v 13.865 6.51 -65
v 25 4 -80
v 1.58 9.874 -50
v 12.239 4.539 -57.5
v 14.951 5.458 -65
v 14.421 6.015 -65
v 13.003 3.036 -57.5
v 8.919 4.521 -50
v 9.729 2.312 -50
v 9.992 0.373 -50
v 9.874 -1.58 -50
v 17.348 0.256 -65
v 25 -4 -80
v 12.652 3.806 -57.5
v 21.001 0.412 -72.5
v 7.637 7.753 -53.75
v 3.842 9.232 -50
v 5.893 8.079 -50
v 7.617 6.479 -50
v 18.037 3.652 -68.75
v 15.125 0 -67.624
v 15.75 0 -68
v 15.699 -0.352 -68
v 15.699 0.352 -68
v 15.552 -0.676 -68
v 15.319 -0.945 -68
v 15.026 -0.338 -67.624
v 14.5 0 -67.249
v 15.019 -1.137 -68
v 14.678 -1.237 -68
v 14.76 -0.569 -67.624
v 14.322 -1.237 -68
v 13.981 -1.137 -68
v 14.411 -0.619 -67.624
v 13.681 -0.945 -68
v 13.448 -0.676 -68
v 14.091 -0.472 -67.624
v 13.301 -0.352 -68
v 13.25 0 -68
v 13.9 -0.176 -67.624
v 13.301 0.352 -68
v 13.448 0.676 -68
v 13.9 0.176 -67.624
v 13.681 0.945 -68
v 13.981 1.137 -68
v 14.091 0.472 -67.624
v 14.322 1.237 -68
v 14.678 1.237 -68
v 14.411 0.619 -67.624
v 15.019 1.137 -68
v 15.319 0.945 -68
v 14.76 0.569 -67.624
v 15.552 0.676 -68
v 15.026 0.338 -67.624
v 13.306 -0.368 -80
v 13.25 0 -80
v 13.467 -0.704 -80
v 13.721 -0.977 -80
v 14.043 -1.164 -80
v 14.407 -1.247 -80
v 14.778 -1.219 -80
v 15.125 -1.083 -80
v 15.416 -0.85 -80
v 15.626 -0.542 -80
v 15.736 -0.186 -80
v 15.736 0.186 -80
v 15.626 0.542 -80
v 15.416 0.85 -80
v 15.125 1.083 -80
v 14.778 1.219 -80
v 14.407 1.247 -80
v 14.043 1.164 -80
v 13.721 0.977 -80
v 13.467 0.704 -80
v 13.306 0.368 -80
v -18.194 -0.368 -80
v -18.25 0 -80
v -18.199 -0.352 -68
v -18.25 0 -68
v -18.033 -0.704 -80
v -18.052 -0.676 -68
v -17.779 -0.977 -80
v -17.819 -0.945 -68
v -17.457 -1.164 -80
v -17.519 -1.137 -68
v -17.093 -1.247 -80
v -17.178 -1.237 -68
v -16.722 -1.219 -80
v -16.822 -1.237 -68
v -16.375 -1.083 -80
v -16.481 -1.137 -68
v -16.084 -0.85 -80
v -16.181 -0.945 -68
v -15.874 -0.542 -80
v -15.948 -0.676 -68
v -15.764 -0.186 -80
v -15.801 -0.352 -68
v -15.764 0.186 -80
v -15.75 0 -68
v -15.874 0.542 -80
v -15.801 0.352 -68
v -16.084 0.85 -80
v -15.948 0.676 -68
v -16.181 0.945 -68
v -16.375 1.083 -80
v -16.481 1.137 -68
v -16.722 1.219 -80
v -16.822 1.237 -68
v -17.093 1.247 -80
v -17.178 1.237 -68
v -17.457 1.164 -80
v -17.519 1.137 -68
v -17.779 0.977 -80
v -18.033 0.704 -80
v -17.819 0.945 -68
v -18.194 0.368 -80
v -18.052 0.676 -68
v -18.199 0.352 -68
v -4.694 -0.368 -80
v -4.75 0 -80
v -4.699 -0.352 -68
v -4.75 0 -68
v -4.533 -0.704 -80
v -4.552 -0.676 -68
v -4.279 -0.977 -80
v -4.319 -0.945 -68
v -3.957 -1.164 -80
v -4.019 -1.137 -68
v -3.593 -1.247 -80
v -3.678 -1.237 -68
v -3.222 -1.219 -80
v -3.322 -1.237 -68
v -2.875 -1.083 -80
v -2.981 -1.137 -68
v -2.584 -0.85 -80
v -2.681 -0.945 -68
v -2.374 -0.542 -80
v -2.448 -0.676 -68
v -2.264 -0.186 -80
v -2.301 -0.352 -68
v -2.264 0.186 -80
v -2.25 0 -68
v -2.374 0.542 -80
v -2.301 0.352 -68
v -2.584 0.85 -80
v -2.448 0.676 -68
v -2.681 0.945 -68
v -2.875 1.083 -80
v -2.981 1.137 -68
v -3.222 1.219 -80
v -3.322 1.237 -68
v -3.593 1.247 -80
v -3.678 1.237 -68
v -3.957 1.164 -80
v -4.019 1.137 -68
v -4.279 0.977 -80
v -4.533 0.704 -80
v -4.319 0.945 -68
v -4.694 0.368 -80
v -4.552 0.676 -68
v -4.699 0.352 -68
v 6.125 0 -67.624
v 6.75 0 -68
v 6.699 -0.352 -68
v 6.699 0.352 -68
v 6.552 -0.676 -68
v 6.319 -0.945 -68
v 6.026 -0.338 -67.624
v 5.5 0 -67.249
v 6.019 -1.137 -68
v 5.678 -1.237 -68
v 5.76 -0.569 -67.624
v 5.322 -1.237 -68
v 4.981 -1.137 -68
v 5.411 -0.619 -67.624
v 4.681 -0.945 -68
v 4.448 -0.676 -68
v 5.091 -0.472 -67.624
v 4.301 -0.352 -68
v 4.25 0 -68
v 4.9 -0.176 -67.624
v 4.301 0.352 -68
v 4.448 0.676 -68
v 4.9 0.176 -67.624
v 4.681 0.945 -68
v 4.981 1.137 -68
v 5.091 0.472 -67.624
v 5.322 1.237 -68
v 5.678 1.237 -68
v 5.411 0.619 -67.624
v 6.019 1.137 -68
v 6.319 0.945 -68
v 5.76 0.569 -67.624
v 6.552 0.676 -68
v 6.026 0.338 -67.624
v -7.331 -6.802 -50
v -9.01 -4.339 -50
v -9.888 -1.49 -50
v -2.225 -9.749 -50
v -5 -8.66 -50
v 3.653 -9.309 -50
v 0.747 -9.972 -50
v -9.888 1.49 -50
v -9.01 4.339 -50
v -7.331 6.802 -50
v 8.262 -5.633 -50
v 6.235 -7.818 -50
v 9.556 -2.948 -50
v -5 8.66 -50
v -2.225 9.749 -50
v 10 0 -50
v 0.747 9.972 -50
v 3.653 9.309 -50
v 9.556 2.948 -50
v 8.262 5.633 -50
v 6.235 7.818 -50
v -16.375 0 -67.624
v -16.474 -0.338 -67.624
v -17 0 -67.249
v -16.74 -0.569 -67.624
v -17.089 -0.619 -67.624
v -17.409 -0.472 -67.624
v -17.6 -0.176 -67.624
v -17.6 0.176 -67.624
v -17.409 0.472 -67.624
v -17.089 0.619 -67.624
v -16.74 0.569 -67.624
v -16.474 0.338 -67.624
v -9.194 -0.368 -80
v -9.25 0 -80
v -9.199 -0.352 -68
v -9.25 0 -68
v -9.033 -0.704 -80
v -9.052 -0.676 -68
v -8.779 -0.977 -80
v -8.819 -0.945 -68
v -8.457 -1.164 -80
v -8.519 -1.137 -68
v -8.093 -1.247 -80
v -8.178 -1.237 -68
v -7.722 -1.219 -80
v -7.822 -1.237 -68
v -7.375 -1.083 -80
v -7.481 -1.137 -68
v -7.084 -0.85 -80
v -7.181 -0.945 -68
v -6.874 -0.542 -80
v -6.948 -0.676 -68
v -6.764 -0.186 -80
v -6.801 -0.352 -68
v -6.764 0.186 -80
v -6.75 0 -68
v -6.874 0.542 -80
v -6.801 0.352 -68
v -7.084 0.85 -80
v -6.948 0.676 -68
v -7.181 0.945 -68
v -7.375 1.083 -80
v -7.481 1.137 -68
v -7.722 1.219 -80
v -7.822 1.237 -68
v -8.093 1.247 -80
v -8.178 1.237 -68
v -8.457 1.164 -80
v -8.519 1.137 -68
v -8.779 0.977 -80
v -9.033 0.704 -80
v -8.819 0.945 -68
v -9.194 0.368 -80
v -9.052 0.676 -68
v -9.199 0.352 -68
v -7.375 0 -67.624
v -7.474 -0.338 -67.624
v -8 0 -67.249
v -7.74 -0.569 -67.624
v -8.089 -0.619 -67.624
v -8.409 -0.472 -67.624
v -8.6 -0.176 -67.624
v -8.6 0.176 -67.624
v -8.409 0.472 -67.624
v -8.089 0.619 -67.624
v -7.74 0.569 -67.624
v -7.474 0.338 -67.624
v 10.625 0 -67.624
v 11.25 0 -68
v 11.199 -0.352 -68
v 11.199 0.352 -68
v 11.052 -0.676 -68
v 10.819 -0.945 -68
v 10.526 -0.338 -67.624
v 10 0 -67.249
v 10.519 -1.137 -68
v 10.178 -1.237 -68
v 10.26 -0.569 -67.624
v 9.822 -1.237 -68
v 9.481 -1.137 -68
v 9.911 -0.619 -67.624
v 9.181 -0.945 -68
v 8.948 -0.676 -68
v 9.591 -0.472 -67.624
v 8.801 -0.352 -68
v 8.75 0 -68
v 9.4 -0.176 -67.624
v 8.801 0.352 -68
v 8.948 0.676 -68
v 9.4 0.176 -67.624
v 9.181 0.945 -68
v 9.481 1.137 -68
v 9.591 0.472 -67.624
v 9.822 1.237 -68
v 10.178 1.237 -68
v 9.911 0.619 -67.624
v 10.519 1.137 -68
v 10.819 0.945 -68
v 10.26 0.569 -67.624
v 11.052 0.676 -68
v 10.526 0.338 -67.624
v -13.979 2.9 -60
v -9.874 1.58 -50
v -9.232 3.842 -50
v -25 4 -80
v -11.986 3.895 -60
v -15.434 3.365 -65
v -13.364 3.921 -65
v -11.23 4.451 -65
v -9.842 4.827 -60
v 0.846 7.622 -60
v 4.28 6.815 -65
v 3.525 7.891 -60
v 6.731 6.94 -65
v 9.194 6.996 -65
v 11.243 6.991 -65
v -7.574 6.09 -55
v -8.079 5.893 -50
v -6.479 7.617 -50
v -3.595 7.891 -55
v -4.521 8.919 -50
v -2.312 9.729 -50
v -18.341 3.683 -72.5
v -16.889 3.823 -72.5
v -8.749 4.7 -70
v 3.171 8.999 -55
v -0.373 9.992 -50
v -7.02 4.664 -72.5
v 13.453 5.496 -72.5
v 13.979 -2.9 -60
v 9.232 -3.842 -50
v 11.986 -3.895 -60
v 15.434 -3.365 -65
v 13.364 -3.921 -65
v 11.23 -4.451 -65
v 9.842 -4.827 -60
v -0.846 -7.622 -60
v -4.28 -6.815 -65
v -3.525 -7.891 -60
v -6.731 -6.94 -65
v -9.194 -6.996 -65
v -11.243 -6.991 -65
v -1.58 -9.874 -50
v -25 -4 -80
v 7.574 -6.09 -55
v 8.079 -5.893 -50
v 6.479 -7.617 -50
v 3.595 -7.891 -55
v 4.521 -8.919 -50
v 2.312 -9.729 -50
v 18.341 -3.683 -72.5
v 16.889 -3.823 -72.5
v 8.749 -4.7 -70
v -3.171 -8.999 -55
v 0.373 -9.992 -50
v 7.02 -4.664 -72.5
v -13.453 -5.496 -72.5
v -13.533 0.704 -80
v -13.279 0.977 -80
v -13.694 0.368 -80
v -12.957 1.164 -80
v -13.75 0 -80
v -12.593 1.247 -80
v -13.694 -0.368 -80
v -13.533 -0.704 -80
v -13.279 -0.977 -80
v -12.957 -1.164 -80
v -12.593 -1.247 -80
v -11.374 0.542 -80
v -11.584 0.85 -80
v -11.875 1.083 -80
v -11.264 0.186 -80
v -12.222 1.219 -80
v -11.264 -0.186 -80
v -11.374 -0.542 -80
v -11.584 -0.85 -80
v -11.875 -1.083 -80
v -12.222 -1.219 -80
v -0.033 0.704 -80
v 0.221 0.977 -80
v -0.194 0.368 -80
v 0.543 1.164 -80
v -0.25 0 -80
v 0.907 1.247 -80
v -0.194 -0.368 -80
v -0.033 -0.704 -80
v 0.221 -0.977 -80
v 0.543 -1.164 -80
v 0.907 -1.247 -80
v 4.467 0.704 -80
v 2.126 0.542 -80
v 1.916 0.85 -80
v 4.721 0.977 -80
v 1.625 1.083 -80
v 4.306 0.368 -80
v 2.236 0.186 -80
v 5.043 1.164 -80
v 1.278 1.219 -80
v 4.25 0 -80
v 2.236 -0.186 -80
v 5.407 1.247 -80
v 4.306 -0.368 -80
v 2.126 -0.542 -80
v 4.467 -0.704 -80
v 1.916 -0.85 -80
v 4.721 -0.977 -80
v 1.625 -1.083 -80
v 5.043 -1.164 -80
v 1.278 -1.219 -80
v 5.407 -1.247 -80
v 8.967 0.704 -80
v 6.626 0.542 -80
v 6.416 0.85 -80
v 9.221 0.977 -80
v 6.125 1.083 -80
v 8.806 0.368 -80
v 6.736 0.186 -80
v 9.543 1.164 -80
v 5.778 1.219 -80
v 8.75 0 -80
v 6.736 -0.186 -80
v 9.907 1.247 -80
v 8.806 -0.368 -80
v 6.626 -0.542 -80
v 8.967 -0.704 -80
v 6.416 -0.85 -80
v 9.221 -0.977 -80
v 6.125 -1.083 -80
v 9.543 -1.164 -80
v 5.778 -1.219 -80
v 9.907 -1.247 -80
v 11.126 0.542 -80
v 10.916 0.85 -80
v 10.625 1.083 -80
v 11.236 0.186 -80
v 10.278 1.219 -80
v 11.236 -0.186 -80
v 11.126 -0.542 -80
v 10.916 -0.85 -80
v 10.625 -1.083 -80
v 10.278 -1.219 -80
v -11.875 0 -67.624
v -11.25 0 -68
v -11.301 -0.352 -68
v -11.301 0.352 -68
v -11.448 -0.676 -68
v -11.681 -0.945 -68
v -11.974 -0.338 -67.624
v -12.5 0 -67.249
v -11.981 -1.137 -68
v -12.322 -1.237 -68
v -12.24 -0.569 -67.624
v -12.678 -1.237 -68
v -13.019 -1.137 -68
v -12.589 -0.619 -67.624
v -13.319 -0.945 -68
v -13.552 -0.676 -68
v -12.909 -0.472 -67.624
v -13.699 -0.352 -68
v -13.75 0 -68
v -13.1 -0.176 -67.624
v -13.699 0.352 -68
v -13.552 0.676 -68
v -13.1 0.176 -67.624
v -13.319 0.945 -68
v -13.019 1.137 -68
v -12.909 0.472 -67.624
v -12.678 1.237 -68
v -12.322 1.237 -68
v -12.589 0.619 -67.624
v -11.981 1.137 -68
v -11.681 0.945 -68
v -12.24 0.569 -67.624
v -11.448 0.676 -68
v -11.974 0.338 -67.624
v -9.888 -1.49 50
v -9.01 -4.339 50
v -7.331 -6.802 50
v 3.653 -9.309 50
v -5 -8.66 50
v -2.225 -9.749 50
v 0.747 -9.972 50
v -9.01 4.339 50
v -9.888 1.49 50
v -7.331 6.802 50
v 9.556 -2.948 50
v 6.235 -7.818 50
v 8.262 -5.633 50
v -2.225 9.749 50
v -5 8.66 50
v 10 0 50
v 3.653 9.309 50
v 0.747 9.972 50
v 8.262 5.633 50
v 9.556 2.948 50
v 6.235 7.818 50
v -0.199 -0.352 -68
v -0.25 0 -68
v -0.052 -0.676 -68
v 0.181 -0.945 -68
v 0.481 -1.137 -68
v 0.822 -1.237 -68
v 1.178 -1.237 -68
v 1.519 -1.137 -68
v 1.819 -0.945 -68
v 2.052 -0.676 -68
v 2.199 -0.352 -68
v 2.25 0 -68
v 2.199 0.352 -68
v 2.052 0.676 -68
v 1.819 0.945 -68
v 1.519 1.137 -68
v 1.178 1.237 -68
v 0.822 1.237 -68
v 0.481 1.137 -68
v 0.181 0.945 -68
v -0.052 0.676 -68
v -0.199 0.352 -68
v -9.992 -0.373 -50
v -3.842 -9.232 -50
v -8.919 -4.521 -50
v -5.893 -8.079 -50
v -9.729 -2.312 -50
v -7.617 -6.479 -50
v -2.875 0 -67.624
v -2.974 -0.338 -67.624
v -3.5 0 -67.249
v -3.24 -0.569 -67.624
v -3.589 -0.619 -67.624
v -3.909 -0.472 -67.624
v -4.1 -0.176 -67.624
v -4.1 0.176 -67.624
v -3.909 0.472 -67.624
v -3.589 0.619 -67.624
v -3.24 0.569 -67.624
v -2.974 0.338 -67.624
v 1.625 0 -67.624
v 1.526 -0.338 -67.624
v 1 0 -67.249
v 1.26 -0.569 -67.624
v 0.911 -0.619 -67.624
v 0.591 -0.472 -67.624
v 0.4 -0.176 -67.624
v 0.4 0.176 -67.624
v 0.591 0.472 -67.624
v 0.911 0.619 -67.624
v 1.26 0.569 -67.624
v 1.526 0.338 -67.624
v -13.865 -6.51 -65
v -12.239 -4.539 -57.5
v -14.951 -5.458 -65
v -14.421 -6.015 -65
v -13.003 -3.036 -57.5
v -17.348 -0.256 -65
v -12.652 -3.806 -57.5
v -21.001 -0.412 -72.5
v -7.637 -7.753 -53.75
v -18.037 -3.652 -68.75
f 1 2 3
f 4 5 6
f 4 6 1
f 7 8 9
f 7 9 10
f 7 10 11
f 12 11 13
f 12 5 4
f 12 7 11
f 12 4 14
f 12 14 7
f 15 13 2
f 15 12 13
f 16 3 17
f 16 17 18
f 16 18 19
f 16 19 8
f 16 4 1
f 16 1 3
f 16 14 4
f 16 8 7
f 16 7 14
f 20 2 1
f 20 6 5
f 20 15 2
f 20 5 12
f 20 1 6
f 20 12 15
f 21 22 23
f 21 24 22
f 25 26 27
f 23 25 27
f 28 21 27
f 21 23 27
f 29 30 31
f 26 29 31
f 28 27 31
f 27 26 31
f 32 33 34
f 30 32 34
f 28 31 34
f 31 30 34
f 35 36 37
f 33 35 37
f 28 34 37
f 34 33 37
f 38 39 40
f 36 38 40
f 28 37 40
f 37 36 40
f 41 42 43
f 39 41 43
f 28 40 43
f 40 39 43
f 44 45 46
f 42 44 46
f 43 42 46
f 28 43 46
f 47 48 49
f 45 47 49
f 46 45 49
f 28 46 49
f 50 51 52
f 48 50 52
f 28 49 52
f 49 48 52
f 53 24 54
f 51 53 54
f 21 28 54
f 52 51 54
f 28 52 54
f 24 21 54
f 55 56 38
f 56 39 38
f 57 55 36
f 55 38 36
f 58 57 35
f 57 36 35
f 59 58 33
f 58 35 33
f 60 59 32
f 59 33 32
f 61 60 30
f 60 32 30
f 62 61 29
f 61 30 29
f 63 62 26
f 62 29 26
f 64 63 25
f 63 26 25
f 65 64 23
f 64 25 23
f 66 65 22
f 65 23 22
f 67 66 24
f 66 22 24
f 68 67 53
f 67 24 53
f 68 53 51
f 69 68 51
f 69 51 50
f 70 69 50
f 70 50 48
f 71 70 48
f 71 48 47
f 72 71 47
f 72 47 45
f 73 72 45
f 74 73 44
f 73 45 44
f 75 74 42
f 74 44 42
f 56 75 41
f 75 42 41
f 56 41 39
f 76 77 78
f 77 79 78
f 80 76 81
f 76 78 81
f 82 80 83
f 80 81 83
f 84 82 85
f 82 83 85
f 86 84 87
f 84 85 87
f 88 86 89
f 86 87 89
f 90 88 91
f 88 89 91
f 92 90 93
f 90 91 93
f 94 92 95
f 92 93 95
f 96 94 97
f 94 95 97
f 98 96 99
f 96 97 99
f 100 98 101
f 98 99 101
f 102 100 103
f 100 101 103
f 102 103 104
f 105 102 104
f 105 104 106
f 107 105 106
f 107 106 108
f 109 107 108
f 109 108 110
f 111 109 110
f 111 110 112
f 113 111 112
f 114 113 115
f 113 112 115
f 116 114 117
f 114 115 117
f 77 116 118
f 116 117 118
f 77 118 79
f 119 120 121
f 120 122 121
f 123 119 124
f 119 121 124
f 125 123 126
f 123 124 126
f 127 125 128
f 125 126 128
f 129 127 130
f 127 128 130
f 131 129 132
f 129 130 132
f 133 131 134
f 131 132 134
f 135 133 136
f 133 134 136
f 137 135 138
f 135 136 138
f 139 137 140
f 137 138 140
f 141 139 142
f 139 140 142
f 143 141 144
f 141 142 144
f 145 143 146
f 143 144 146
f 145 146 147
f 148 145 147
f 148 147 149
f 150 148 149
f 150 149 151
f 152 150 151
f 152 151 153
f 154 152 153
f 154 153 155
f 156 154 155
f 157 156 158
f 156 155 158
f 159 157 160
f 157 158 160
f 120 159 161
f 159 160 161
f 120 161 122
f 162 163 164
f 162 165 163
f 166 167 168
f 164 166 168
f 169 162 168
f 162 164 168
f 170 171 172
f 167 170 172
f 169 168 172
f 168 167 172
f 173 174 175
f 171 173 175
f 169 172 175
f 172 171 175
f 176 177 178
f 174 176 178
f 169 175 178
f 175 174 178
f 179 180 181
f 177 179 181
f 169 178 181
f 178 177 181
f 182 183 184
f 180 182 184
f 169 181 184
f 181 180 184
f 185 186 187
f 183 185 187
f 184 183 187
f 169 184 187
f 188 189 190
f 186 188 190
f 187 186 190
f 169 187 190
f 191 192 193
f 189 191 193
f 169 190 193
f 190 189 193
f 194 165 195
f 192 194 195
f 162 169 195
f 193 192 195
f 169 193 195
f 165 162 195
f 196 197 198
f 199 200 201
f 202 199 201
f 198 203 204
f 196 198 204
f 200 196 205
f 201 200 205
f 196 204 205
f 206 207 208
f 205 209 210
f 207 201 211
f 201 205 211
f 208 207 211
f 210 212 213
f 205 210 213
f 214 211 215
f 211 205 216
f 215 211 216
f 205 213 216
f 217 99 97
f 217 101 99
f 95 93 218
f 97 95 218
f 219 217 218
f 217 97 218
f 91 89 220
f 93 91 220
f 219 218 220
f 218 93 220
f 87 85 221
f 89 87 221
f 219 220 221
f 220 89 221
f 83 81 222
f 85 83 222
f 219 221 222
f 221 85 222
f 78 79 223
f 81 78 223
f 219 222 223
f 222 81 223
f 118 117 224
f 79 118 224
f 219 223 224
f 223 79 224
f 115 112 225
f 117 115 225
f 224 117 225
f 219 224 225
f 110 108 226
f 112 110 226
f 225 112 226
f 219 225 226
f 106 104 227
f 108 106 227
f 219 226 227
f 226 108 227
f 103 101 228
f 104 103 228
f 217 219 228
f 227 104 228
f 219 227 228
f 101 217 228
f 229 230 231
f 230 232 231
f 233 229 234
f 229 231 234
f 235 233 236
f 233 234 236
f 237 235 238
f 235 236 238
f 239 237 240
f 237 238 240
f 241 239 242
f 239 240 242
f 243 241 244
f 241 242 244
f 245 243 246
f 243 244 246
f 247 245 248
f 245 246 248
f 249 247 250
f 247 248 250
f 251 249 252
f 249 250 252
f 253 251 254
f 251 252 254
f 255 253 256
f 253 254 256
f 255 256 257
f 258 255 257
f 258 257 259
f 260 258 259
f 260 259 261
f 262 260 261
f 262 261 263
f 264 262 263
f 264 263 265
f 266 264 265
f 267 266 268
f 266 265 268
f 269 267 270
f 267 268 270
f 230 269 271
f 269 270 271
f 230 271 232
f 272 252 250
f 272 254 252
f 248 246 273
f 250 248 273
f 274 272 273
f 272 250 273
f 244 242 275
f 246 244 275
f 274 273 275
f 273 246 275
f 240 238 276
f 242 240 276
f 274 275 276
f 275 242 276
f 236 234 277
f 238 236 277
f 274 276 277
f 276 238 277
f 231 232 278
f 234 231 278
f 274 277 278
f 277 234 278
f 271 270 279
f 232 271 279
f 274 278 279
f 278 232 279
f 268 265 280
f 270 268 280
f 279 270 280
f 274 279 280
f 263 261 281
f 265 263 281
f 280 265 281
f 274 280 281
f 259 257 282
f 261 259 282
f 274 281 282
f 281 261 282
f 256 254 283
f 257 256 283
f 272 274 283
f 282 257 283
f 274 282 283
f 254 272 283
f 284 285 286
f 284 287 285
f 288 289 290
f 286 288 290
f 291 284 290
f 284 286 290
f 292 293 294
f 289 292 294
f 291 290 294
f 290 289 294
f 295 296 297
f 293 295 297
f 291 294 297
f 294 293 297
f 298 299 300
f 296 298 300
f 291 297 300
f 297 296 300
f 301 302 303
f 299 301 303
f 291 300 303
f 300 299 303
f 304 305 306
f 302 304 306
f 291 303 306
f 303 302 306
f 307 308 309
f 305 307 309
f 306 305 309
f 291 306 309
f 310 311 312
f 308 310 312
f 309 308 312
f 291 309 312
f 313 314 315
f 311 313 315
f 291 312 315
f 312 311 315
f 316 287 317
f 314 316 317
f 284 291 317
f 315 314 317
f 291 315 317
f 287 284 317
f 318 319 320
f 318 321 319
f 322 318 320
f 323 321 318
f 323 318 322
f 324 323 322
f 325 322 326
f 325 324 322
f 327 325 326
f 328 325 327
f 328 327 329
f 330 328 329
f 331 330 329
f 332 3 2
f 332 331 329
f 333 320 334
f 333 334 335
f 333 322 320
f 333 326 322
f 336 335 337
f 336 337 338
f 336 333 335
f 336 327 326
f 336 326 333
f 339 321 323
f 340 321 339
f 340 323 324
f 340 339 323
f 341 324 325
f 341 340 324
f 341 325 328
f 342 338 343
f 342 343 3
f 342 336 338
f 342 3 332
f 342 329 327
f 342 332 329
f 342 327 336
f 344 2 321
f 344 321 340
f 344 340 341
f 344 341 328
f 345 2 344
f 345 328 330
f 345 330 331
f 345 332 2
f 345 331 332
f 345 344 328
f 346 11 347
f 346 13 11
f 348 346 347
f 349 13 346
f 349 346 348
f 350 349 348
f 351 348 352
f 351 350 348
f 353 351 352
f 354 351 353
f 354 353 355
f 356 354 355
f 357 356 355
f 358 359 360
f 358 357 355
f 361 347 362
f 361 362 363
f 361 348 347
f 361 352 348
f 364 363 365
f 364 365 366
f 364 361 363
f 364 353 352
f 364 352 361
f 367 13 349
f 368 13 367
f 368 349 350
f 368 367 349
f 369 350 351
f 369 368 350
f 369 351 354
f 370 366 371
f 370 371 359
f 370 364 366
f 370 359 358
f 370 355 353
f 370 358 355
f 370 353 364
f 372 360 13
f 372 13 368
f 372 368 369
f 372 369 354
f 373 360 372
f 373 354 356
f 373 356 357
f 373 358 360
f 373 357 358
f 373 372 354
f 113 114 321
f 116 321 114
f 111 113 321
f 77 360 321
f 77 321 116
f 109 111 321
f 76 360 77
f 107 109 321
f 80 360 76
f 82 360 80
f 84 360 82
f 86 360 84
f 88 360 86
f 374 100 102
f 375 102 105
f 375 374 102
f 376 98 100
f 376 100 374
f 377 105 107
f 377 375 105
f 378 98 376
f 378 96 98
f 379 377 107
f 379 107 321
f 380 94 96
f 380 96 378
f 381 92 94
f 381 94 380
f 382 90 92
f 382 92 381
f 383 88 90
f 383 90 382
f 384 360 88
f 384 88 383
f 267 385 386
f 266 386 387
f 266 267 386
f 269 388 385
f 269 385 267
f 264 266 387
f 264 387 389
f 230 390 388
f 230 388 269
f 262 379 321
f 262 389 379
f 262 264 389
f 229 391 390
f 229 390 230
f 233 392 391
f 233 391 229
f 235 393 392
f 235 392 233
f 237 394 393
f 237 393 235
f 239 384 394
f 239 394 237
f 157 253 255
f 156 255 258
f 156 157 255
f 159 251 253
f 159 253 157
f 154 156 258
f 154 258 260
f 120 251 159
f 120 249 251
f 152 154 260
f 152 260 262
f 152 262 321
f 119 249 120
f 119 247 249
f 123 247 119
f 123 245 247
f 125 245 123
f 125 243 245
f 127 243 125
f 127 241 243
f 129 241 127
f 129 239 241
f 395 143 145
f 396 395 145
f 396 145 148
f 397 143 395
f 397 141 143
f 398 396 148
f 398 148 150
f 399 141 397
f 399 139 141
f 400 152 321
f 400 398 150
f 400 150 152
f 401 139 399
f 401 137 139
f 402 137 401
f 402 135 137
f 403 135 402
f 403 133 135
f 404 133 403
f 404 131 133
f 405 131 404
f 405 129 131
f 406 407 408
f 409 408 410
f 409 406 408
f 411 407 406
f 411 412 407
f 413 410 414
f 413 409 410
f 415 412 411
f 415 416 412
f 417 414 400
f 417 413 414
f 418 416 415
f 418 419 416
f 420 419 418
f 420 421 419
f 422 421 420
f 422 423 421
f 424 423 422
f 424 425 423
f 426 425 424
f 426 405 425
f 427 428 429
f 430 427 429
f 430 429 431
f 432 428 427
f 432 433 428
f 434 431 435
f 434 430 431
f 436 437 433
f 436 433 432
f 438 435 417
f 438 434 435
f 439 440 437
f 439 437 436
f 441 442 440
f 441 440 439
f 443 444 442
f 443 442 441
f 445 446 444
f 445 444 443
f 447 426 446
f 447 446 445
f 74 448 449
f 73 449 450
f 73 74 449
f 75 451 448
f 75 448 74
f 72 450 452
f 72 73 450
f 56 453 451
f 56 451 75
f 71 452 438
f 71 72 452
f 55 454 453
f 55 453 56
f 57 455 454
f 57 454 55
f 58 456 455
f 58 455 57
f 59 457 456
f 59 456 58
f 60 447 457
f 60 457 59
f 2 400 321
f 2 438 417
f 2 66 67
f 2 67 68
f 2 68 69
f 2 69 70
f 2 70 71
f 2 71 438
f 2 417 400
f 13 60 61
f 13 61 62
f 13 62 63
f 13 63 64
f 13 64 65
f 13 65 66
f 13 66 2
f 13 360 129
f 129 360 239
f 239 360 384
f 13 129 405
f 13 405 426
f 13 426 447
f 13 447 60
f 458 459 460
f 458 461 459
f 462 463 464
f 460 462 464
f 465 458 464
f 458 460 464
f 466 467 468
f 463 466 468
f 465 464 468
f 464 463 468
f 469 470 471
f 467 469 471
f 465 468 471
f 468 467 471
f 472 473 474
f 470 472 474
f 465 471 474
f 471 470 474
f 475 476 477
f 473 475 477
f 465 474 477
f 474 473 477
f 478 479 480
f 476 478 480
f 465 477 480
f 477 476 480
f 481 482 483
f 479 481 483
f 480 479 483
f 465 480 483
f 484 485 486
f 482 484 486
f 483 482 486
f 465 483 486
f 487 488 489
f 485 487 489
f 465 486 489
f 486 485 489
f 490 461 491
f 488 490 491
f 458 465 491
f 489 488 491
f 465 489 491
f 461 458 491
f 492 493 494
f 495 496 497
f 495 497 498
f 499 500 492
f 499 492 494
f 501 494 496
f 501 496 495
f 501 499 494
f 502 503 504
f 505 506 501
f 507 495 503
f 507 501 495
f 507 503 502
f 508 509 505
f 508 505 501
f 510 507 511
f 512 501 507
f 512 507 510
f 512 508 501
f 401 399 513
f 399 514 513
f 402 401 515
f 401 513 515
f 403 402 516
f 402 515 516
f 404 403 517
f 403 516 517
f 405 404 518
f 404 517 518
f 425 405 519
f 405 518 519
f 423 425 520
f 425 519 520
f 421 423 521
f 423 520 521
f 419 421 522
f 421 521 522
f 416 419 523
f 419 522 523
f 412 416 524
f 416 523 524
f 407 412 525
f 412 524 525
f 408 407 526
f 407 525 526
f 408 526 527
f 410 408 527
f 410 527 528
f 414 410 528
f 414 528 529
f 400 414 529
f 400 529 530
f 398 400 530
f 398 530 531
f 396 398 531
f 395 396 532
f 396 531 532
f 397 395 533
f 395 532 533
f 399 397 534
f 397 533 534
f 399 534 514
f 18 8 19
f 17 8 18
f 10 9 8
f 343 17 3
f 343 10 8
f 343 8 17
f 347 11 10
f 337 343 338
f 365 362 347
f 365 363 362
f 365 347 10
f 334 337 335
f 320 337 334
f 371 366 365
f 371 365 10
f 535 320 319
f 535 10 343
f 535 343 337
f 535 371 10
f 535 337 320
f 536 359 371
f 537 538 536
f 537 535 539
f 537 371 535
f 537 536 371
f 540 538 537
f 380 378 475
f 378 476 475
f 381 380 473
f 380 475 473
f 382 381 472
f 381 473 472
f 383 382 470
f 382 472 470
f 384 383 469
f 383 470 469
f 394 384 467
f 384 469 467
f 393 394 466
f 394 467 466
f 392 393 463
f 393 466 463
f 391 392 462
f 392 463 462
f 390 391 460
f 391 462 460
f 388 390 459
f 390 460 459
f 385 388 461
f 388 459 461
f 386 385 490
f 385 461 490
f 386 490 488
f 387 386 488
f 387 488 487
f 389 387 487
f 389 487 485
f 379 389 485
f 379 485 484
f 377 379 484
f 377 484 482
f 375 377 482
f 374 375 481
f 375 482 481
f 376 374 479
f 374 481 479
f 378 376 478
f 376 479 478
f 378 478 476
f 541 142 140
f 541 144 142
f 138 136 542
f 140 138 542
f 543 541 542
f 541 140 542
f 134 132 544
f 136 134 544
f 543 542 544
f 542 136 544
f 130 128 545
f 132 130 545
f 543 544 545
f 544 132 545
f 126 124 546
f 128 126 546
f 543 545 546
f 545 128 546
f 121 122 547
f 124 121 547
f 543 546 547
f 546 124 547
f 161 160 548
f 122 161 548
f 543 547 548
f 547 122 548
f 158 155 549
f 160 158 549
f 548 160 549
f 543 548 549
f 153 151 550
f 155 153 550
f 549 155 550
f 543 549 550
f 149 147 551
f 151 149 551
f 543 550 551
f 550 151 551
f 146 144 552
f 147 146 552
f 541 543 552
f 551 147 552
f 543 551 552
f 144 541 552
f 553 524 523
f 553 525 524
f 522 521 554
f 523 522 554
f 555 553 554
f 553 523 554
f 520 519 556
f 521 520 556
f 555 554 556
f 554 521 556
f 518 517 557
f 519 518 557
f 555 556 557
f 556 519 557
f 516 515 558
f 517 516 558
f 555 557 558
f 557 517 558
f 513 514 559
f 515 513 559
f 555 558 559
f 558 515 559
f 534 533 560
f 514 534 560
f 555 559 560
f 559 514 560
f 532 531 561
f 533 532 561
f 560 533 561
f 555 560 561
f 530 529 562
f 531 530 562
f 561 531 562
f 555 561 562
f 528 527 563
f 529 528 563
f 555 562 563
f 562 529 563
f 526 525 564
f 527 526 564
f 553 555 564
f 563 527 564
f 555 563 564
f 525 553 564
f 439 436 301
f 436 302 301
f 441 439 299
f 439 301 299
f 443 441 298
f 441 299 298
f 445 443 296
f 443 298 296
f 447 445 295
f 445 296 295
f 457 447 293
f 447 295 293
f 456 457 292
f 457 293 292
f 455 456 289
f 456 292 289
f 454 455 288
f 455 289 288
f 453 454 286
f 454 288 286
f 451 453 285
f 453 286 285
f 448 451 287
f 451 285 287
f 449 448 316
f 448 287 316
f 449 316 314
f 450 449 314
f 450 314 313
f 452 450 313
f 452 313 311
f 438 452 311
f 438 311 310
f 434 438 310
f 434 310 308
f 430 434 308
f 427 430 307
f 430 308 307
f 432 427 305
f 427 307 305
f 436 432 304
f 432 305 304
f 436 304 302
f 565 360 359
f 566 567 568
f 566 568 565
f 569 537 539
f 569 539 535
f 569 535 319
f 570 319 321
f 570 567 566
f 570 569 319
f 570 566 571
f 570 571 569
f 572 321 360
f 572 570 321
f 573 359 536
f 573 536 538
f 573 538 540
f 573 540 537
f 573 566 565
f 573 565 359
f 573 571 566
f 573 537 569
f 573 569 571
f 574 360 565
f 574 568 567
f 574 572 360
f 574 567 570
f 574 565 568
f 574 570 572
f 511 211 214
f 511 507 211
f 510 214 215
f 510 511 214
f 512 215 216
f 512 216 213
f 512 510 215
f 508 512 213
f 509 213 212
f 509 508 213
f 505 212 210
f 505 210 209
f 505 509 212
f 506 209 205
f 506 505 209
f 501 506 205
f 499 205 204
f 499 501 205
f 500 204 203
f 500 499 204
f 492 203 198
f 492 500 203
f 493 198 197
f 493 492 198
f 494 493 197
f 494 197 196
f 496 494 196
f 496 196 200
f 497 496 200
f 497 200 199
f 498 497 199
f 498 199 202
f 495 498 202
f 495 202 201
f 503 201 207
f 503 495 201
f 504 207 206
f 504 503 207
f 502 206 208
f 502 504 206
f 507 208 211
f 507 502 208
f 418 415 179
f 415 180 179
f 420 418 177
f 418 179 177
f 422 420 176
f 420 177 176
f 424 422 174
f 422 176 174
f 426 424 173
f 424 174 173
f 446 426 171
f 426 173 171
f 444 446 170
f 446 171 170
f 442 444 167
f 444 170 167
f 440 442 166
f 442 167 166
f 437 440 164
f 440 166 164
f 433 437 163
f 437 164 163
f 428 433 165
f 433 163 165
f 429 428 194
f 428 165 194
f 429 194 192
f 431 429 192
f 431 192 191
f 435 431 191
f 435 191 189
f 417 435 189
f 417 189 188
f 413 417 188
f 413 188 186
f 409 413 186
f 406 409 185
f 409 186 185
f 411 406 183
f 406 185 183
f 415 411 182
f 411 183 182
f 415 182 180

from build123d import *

# Parameters (mm, degrees)
F0_R     = 10
F1_DEPTH = 50
F4_W     = 50
F4_H     = 8
F7_D     = 2.5
F7_DEPTH = 12
F7_TIP   = 0.7510757738


# Not quite as in the source:
# - the arcs of a loft's sections are written as splines that run evenly, so that the points pair up as in the source's solid
# - a feature names something its author has since deleted; it is built from what else it names


with BuildPart() as f1:
    # F0 (on Top) → F1 (new body, symmetric)
    with BuildSketch(Plane.XY):
        Circle(F0_R)
    extrude(amount=F1_DEPTH, both=True)


with BuildPart() as f5:
    # F2 (on face) → F5 section 0
    with BuildSketch(Plane(origin=(0, 0, -50), x_dir=(1, 0, 0), z_dir=(0, 0, -1))):
        with BuildLine():
            add(Edge.make_bspline(
                [(9.8744063192, 1.5799050111), (9.6675972368, 2.8724617757), (9.2038651591, 4.1233892759), (7.832451684, 6.3534379358), (6.9253098794, 7.3316816666), (4.8048863637, 8.8671607642), (3.5924389487, 9.4237919855), (1.0458206508, 10.0309387473), (-0.2873482464, 10.0812154015), (-1.5799050111, 9.8744063192)],
                knots=[0, 0, 0, 0, 0.25, 0.25, 0.5, 0.5, 0.75, 0.75, 1, 1, 1, 1], degree=3))
            add(Edge.make_bspline(
                [(-1.5799050111, 9.8744063192), (-2.8724617757, 9.6675972368), (-4.1233892759, 9.2038651591), (-6.3534379358, 7.832451684), (-7.3316816666, 6.9253098794), (-8.8671607642, 4.8048863637), (-9.4237919855, 3.5924389487), (-10.0309387473, 1.0458206508), (-10.0812154015, -0.2873482464), (-9.8744063192, -1.5799050111)],
                knots=[0, 0, 0, 0, 0.25, 0.25, 0.5, 0.5, 0.75, 0.75, 1, 1, 1, 1], degree=3))
            add(Edge.make_bspline(
                [(-9.8744063192, -1.5799050111), (-9.6675972368, -2.8724617757), (-9.2038651591, -4.1233892759), (-7.832451684, -6.3534379358), (-6.9253098794, -7.3316816666), (-4.8048863637, -8.8671607642), (-3.5924389487, -9.4237919855), (-1.0458206508, -10.0309387473), (0.2873482464, -10.0812154015), (1.5799050111, -9.8744063192)],
                knots=[0, 0, 0, 0, 0.25, 0.25, 0.5, 0.5, 0.75, 0.75, 1, 1, 1, 1], degree=3))
            add(Edge.make_bspline(
                [(1.5799050111, -9.8744063192), (2.8724617757, -9.6675972368), (4.1233892759, -9.2038651591), (6.3534379358, -7.832451684), (7.3316816666, -6.9253098794), (8.8671607642, -4.8048863637), (9.4237919855, -3.5924389487), (10.0309387473, -1.0458206508), (10.0812154015, 0.2873482464), (9.8744063192, 1.5799050111)],
                knots=[0, 0, 0, 0, 0.25, 0.25, 0.5, 0.5, 0.75, 0.75, 1, 1, 1, 1], degree=3))
        make_face()
    # F4 (on offset) → F5 section 1
    with BuildSketch(Plane(origin=(0, 0, -80), x_dir=(1, 0, 0), z_dir=(0, 0, -1))):
        Rectangle(F4_W, F4_H)
    loft(ruled=True)

    # F7
    with Locations(Plane(origin=(0, 0, -80), x_dir=(1, 0, 0), z_dir=(0, 0, -1))):
        with Locations((-17, 0), (-12.5, 0), (-8, 0), (-3.5, 0), (1, 0), (5.5, 0), (10, 0), (14.5, 0)):
            Hole(F7_D / 2, depth=F7_DEPTH)
            with Locations((0, 0, -(F7_DEPTH + F7_TIP / 2))):  # 118° drill point
                Cone(0, F7_D / 2, F7_TIP, mode=Mode.SUBTRACT)


solid = Compound([f1.part, f5.part])
